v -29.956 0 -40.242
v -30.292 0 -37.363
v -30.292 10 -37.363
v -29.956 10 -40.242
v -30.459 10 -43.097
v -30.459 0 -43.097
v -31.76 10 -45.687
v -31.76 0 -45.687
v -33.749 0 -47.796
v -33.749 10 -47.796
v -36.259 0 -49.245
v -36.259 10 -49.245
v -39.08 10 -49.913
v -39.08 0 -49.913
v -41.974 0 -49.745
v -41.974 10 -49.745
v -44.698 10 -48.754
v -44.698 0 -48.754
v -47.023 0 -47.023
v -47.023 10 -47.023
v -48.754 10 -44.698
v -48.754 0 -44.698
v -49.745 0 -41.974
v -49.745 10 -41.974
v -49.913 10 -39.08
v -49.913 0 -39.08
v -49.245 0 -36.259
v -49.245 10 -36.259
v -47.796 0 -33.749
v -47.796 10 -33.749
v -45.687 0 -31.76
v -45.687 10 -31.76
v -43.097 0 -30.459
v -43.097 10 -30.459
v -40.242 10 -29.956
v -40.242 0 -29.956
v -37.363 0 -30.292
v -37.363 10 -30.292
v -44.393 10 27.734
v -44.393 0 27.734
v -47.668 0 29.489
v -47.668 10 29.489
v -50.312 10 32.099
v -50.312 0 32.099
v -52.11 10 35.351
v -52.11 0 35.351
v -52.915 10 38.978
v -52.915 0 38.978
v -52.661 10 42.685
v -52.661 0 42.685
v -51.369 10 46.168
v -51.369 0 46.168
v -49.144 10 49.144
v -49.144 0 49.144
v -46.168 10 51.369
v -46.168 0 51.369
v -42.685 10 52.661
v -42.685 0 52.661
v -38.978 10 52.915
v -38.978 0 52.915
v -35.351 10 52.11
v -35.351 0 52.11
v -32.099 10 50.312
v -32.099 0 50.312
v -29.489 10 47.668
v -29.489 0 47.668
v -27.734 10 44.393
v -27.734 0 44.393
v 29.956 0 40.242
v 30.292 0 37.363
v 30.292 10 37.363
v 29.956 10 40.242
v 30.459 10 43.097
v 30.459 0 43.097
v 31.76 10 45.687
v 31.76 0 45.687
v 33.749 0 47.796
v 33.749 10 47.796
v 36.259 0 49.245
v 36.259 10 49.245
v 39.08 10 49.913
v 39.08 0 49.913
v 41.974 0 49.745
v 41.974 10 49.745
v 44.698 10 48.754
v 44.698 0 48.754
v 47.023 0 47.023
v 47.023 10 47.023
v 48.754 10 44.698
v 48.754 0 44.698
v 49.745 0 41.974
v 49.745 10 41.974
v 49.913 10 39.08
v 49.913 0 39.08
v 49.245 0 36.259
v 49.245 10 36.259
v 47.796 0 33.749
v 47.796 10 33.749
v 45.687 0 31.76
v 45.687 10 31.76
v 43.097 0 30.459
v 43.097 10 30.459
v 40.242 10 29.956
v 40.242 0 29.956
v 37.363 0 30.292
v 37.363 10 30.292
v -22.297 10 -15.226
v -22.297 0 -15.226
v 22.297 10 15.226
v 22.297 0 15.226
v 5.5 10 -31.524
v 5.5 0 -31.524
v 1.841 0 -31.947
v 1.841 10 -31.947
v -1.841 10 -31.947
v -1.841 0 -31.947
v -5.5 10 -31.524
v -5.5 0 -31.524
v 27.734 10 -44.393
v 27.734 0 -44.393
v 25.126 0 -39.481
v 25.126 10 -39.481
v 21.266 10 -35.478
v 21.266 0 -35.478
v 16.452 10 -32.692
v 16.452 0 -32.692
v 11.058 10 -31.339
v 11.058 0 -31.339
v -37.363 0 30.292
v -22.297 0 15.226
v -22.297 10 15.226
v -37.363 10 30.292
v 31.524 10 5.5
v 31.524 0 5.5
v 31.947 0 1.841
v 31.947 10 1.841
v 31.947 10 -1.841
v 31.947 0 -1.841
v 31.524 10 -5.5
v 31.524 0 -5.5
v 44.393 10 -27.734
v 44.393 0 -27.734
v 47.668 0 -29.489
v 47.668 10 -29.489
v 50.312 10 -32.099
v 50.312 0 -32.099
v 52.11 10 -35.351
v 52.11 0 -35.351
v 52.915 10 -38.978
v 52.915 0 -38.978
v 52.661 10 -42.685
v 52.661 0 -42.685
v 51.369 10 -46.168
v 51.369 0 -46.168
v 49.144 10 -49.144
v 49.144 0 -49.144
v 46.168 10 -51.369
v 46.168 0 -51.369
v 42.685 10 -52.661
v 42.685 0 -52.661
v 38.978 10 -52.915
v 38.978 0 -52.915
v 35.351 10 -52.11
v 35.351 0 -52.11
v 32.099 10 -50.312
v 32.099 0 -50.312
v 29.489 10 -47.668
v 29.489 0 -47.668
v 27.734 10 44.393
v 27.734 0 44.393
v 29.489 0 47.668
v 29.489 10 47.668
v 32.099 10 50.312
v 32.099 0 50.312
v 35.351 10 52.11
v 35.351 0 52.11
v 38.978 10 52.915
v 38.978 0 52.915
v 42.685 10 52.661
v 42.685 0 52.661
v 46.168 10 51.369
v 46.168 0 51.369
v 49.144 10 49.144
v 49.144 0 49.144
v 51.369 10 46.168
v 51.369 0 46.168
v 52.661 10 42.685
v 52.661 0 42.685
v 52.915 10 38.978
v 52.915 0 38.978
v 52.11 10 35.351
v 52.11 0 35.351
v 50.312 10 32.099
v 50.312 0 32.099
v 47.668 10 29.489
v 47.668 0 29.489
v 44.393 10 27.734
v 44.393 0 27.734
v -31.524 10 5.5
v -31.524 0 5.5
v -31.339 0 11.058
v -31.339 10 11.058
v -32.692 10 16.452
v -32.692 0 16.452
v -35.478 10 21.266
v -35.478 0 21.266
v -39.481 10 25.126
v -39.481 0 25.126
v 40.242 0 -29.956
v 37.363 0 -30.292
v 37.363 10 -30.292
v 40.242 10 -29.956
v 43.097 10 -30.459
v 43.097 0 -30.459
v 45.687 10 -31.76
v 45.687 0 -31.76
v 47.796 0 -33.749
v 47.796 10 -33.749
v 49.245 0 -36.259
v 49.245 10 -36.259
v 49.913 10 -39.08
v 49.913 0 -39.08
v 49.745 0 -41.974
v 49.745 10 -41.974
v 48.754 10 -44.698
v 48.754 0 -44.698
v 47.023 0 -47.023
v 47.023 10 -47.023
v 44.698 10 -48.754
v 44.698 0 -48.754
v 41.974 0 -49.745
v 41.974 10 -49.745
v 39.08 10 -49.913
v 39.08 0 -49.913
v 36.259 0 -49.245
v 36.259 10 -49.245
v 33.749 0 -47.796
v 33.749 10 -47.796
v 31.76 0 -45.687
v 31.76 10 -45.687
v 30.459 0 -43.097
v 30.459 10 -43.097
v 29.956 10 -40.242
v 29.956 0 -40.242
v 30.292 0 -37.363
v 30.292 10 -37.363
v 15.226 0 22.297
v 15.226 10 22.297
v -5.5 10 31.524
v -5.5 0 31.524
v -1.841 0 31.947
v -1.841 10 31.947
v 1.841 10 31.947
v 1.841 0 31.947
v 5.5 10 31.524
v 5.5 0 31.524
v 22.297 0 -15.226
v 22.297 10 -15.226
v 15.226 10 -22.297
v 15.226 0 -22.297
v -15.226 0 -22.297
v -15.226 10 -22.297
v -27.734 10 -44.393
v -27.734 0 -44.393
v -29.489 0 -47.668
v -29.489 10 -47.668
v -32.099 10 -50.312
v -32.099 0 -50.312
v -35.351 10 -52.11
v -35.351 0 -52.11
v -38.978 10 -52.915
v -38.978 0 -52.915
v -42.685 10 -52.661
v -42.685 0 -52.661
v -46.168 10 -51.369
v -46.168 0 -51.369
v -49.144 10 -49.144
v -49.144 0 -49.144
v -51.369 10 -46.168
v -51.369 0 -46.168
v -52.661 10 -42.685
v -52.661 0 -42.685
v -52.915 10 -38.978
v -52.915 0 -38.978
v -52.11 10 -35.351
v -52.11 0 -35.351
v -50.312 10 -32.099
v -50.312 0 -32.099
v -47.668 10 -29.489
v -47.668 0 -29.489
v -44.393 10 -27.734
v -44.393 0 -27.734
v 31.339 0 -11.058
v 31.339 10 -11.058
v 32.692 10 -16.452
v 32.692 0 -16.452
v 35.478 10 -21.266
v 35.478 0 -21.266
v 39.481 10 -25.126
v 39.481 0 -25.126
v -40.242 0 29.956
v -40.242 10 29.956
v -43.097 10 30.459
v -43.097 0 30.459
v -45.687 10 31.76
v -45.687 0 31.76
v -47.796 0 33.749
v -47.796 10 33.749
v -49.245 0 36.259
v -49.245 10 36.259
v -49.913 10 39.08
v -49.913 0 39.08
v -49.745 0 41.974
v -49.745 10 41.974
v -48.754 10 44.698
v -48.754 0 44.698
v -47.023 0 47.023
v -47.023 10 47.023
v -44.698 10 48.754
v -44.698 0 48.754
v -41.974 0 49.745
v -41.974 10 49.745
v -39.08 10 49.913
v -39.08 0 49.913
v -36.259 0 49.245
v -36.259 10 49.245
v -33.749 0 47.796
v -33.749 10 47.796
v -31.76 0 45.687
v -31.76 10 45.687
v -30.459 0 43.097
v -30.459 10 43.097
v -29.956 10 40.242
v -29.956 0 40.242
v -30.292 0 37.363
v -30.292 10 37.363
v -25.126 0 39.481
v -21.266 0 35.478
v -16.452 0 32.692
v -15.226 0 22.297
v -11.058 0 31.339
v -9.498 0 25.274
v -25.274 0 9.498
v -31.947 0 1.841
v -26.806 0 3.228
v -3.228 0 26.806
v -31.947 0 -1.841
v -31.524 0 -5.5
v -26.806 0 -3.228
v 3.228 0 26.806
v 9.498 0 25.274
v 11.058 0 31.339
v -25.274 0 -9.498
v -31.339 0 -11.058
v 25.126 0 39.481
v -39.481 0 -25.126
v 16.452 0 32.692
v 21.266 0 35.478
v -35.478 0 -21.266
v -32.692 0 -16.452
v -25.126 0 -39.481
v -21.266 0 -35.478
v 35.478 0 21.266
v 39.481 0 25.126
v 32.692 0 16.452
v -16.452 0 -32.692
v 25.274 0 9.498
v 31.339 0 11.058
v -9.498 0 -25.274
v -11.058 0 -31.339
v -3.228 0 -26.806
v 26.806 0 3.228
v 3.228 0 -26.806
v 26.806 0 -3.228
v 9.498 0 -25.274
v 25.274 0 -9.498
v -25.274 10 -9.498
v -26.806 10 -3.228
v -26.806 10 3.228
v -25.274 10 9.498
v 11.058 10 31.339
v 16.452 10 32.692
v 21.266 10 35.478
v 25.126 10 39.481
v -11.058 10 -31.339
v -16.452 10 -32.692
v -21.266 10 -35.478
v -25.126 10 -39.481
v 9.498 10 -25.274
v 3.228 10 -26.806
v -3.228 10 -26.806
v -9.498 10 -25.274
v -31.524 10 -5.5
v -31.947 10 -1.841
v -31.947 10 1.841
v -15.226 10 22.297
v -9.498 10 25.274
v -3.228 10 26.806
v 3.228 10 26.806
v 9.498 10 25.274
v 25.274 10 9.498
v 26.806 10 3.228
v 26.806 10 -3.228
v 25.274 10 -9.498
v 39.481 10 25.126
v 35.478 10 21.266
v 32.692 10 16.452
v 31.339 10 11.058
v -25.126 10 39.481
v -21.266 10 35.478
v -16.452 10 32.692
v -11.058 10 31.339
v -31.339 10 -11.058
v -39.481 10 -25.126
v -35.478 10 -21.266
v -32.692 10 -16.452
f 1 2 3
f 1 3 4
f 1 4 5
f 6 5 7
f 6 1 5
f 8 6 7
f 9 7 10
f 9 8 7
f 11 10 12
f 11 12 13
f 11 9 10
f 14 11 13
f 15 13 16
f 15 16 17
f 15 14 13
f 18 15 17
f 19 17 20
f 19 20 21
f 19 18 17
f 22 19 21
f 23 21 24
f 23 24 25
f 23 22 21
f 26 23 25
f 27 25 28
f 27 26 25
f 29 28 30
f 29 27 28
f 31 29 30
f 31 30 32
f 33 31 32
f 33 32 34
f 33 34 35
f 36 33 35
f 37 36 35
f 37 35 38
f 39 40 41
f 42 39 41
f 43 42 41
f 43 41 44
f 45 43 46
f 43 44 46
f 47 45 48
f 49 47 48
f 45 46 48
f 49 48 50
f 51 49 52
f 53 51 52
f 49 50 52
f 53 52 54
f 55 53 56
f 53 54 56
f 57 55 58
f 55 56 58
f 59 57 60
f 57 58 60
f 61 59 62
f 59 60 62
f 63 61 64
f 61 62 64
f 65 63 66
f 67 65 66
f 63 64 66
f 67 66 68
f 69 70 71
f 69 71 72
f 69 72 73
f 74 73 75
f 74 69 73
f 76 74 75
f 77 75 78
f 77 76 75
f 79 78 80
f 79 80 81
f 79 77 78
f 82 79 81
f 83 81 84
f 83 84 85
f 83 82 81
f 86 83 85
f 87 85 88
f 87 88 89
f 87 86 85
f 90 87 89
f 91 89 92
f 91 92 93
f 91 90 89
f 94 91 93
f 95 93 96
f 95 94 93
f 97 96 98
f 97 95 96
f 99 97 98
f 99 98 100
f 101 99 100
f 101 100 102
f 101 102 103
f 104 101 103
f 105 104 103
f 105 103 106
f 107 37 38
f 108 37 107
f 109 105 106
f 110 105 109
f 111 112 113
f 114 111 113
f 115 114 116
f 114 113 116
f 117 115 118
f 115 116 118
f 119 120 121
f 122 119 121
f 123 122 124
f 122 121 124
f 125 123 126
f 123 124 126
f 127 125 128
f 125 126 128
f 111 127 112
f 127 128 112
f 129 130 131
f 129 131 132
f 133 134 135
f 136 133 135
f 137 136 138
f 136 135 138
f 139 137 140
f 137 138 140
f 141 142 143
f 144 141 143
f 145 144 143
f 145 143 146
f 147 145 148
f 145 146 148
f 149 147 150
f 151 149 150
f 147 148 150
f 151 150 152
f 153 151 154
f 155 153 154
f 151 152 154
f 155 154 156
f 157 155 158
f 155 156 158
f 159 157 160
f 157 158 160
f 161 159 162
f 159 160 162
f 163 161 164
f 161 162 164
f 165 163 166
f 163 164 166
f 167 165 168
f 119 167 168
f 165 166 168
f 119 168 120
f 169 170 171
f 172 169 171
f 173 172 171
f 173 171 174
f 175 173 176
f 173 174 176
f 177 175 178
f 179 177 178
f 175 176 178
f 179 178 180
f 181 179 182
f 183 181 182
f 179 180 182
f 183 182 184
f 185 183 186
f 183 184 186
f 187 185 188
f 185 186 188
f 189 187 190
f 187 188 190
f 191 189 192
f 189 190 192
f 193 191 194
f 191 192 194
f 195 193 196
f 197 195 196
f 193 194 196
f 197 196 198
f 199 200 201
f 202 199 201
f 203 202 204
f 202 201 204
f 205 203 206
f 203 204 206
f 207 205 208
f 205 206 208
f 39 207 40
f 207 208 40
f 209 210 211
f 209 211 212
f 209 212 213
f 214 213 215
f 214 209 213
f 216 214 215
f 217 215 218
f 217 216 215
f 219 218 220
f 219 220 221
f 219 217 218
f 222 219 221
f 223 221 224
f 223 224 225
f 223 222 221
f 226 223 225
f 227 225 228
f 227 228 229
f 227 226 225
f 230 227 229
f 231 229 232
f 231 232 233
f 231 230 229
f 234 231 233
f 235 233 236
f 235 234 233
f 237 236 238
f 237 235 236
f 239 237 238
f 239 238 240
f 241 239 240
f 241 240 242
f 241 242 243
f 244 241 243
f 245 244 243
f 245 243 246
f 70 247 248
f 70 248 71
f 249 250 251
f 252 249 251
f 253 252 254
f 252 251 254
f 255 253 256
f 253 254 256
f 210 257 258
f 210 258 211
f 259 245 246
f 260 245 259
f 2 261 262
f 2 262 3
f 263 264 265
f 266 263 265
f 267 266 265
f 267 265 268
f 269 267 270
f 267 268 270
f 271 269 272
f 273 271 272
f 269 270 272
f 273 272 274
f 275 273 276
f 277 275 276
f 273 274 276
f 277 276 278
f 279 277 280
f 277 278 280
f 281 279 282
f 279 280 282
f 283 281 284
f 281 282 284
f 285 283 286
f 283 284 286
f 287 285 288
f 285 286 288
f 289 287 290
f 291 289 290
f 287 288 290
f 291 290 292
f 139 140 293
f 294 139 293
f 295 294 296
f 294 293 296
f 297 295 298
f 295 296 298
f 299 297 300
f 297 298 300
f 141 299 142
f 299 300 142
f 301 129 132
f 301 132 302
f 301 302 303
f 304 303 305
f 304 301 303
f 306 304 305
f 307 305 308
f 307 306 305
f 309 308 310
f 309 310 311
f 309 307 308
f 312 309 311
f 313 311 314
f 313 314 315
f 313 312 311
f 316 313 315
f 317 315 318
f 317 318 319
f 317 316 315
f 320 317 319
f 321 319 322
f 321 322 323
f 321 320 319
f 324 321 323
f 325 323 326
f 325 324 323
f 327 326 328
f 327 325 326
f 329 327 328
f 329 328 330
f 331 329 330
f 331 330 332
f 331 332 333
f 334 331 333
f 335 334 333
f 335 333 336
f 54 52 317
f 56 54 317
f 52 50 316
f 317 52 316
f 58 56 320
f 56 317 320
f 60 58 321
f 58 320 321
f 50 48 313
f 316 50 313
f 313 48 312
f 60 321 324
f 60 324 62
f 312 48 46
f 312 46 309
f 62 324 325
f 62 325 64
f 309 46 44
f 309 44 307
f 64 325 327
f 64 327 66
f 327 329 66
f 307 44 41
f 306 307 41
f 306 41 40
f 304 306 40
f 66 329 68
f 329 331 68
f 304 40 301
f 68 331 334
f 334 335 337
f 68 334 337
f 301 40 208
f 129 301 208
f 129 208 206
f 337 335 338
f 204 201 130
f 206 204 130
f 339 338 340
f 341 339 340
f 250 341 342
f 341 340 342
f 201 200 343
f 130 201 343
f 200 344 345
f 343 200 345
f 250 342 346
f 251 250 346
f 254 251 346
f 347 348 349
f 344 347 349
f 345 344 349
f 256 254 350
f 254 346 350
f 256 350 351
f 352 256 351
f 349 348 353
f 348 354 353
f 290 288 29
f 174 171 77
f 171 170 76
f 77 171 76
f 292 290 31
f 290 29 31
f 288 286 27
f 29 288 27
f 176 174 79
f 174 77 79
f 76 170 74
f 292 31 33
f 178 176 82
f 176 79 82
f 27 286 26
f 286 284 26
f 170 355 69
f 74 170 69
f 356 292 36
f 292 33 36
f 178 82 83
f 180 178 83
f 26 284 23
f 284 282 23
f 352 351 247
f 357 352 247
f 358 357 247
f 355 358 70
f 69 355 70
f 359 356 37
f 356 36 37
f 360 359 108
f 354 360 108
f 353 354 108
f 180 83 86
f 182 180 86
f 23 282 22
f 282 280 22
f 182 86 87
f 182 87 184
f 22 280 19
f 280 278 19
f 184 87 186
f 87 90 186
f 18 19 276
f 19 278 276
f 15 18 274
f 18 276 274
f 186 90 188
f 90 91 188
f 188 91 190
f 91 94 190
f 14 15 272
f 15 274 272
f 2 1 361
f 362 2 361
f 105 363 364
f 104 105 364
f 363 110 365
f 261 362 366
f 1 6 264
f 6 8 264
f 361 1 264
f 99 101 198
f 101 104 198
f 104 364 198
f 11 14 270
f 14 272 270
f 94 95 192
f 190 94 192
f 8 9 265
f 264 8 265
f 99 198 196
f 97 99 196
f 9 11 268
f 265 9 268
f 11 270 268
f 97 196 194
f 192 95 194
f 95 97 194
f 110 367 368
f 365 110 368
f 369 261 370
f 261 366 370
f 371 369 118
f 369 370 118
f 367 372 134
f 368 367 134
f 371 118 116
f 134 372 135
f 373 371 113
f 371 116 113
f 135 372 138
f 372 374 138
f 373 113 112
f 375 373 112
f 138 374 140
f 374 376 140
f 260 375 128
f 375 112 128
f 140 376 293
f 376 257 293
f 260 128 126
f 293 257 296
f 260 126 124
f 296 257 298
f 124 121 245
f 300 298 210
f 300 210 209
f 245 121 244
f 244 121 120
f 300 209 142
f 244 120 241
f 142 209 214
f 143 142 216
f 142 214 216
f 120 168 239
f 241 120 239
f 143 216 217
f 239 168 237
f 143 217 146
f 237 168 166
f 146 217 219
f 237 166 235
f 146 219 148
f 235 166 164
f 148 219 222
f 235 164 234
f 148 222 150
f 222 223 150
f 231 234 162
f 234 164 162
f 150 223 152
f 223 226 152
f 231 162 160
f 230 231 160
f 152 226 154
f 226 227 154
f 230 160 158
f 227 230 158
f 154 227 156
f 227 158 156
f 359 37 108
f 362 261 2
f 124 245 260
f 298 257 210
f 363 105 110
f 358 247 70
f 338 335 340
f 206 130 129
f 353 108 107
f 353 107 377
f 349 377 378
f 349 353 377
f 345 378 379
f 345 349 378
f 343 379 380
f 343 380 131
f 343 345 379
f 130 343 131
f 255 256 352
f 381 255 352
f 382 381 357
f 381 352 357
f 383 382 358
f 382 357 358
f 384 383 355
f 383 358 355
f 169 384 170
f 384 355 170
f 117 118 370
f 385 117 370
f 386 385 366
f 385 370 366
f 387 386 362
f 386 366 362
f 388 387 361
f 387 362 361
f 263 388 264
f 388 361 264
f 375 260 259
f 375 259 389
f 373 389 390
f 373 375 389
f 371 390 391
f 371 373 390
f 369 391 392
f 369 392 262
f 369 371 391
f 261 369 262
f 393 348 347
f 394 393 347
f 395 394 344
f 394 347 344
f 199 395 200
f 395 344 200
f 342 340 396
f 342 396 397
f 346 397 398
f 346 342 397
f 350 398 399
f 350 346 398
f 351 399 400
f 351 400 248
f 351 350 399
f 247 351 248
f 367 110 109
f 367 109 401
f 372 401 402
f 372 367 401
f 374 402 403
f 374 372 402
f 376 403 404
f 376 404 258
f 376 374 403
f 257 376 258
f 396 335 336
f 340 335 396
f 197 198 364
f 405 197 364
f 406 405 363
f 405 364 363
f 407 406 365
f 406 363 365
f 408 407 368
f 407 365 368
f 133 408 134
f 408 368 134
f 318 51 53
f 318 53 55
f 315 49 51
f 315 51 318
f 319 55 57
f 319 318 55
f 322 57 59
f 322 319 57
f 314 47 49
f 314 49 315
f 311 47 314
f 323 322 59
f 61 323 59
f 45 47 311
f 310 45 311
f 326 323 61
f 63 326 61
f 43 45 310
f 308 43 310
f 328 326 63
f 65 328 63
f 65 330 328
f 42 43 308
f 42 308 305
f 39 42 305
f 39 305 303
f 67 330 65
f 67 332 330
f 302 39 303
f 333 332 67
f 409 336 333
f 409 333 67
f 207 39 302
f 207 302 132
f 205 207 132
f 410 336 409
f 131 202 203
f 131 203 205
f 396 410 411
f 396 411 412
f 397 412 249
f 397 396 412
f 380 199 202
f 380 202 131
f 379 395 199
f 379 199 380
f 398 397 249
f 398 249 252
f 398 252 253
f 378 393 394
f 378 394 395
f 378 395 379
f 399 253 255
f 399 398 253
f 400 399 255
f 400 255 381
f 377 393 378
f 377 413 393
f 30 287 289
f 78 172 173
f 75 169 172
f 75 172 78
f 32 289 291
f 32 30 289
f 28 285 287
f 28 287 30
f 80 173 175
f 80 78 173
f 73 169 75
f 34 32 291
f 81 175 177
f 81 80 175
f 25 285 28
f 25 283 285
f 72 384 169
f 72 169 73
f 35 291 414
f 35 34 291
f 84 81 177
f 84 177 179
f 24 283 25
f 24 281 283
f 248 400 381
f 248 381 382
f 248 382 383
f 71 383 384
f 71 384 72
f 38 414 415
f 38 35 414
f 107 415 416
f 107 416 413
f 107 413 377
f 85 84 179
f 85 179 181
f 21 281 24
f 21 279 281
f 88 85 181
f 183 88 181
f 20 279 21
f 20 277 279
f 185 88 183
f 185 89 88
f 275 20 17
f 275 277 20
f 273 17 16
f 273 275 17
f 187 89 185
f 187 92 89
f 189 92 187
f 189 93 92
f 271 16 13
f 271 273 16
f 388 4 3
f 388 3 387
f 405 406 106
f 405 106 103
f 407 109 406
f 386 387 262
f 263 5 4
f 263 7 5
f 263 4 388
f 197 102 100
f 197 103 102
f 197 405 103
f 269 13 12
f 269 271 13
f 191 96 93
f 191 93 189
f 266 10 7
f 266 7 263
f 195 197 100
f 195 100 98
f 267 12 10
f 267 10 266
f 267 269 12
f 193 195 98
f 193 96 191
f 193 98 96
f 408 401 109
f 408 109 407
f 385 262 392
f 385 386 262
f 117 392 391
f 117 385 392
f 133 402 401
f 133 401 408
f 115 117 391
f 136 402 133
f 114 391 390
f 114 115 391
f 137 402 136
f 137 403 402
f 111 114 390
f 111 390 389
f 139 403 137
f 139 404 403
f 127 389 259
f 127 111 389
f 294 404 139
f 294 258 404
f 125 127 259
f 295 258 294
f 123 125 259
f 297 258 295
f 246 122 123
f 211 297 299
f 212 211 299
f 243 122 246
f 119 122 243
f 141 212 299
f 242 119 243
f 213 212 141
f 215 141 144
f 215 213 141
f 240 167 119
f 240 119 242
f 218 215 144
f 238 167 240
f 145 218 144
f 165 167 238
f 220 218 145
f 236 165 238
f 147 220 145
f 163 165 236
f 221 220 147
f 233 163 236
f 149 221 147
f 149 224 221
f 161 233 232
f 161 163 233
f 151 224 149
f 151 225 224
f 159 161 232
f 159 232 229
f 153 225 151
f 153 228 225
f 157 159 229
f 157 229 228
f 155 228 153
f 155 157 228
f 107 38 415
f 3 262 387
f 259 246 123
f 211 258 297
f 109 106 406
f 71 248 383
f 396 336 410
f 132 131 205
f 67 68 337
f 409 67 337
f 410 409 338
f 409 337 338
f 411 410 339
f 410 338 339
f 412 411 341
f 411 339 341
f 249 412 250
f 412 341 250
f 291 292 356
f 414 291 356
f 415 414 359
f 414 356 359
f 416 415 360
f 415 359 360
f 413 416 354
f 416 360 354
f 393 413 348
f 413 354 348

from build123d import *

# Parameters (mm, degrees)
BOSS_EXTRUDE1_DEPTH = 10


with BuildPart() as part:
    # Sketch1 → Boss-Extrude1 (new body)
    with BuildSketch(Plane(origin=(0, 0, 0), x_dir=(1, 0, 0), z_dir=(0, 1, 0))):
        with BuildLine():
            ThreePointArc((-31.523820357, 5.499886369), (-32, 0), (-31.523820357, -5.499886369))
            ThreePointArc((-31.523820357, -5.499886369), (-33.916662735, -18.956279365), (-44.393071751, -27.733810979))
            ThreePointArc((-44.393071751, -27.733810979), (-49.143921292, -49.143921292), (-27.733810979, -44.393071751))
            ThreePointArc((-27.733810979, -44.393071751), (-18.956279365, -33.916662735), (-5.499886369, -31.523820357))
            ThreePointArc((-5.499886369, -31.523820357), (0, -32), (5.499886369, -31.523820357))
            ThreePointArc((5.499886369, -31.523820357), (18.956279365, -33.916662735), (27.733810979, -44.393071751))
            ThreePointArc((27.733810979, -44.393071751), (49.143921292, -49.143921292), (44.393071751, -27.733810979))
            ThreePointArc((44.393071751, -27.733810979), (33.916662735, -18.956279365), (31.523820357, -5.499886369))
            ThreePointArc((31.523820357, -5.499886369), (32, 0), (31.523820357, 5.499886369))
            ThreePointArc((31.523820357, 5.499886369), (33.916662735, 18.956279365), (44.393071751, 27.733810979))
            ThreePointArc((44.393071751, 27.733810979), (49.143921292, 49.143921292), (27.733810979, 44.393071751))
            ThreePointArc((27.733810979, 44.393071751), (18.956279365, 33.916662735), (5.499886369, 31.523820357))
            ThreePointArc((5.499886369, 31.523820357), (0, 32), (-5.499886369, 31.523820357))
            ThreePointArc((-5.499886369, 31.523820357), (-18.956279365, 33.916662735), (-27.733810979, 44.393071751))
            ThreePointArc((-27.733810979, 44.393071751), (-49.143921292, 49.143921292), (-44.393071751, 27.733810979))
            ThreePointArc((-44.393071751, 27.733810979), (-33.916662735, 18.956279365), (-31.523820357, 5.499886369))
        make_face()
        with BuildLine():
            Line((-37.363342686, 30.292274874), (-22.297196945, 15.226129133))
            ThreePointArc((-22.297196945, 15.226129133), (-27, 0), (-22.297196945, -15.226129133))
            Line((-22.297196945, -15.226129133), (-37.363342686, -30.292274874))
            ThreePointArc((-37.363342686, -30.292274874), (-47.022600949, -47.022600949), (-30.292274874, -37.363342686))
            Line((-30.292274874, -37.363342686), (-15.226129133, -22.297196945))
            ThreePointArc((-15.226129133, -22.297196945), (0, -27), (15.226129133, -22.297196945))
            Line((15.226129133, -22.297196945), (30.292274874, -37.363342686))
            ThreePointArc((30.292274874, -37.363342686), (47.022600949, -47.022600949), (37.363342686, -30.292274874))
            Line((37.363342686, -30.292274874), (22.297196945, -15.226129133))
            ThreePointArc((22.297196945, -15.226129133), (27, 0), (22.297196945, 15.226129133))
            Line((22.297196945, 15.226129133), (37.363342686, 30.292274874))
            ThreePointArc((37.363342686, 30.292274874), (47.022600949, 47.022600949), (30.292274874, 37.363342686))
            Line((30.292274874, 37.363342686), (15.226129133, 22.297196945))
            ThreePointArc((15.226129133, 22.297196945), (0, 27), (-15.226129133, 22.297196945))
            Line((-15.226129133, 22.297196945), (-30.292274874, 37.363342686))
            ThreePointArc((-30.292274874, 37.363342686), (-47.022600949, 47.022600949), (-37.363342686, 30.292274874))
        make_face(mode=Mode.SUBTRACT)
    extrude(amount=BOSS_EXTRUDE1_DEPTH)


solid = part.part
